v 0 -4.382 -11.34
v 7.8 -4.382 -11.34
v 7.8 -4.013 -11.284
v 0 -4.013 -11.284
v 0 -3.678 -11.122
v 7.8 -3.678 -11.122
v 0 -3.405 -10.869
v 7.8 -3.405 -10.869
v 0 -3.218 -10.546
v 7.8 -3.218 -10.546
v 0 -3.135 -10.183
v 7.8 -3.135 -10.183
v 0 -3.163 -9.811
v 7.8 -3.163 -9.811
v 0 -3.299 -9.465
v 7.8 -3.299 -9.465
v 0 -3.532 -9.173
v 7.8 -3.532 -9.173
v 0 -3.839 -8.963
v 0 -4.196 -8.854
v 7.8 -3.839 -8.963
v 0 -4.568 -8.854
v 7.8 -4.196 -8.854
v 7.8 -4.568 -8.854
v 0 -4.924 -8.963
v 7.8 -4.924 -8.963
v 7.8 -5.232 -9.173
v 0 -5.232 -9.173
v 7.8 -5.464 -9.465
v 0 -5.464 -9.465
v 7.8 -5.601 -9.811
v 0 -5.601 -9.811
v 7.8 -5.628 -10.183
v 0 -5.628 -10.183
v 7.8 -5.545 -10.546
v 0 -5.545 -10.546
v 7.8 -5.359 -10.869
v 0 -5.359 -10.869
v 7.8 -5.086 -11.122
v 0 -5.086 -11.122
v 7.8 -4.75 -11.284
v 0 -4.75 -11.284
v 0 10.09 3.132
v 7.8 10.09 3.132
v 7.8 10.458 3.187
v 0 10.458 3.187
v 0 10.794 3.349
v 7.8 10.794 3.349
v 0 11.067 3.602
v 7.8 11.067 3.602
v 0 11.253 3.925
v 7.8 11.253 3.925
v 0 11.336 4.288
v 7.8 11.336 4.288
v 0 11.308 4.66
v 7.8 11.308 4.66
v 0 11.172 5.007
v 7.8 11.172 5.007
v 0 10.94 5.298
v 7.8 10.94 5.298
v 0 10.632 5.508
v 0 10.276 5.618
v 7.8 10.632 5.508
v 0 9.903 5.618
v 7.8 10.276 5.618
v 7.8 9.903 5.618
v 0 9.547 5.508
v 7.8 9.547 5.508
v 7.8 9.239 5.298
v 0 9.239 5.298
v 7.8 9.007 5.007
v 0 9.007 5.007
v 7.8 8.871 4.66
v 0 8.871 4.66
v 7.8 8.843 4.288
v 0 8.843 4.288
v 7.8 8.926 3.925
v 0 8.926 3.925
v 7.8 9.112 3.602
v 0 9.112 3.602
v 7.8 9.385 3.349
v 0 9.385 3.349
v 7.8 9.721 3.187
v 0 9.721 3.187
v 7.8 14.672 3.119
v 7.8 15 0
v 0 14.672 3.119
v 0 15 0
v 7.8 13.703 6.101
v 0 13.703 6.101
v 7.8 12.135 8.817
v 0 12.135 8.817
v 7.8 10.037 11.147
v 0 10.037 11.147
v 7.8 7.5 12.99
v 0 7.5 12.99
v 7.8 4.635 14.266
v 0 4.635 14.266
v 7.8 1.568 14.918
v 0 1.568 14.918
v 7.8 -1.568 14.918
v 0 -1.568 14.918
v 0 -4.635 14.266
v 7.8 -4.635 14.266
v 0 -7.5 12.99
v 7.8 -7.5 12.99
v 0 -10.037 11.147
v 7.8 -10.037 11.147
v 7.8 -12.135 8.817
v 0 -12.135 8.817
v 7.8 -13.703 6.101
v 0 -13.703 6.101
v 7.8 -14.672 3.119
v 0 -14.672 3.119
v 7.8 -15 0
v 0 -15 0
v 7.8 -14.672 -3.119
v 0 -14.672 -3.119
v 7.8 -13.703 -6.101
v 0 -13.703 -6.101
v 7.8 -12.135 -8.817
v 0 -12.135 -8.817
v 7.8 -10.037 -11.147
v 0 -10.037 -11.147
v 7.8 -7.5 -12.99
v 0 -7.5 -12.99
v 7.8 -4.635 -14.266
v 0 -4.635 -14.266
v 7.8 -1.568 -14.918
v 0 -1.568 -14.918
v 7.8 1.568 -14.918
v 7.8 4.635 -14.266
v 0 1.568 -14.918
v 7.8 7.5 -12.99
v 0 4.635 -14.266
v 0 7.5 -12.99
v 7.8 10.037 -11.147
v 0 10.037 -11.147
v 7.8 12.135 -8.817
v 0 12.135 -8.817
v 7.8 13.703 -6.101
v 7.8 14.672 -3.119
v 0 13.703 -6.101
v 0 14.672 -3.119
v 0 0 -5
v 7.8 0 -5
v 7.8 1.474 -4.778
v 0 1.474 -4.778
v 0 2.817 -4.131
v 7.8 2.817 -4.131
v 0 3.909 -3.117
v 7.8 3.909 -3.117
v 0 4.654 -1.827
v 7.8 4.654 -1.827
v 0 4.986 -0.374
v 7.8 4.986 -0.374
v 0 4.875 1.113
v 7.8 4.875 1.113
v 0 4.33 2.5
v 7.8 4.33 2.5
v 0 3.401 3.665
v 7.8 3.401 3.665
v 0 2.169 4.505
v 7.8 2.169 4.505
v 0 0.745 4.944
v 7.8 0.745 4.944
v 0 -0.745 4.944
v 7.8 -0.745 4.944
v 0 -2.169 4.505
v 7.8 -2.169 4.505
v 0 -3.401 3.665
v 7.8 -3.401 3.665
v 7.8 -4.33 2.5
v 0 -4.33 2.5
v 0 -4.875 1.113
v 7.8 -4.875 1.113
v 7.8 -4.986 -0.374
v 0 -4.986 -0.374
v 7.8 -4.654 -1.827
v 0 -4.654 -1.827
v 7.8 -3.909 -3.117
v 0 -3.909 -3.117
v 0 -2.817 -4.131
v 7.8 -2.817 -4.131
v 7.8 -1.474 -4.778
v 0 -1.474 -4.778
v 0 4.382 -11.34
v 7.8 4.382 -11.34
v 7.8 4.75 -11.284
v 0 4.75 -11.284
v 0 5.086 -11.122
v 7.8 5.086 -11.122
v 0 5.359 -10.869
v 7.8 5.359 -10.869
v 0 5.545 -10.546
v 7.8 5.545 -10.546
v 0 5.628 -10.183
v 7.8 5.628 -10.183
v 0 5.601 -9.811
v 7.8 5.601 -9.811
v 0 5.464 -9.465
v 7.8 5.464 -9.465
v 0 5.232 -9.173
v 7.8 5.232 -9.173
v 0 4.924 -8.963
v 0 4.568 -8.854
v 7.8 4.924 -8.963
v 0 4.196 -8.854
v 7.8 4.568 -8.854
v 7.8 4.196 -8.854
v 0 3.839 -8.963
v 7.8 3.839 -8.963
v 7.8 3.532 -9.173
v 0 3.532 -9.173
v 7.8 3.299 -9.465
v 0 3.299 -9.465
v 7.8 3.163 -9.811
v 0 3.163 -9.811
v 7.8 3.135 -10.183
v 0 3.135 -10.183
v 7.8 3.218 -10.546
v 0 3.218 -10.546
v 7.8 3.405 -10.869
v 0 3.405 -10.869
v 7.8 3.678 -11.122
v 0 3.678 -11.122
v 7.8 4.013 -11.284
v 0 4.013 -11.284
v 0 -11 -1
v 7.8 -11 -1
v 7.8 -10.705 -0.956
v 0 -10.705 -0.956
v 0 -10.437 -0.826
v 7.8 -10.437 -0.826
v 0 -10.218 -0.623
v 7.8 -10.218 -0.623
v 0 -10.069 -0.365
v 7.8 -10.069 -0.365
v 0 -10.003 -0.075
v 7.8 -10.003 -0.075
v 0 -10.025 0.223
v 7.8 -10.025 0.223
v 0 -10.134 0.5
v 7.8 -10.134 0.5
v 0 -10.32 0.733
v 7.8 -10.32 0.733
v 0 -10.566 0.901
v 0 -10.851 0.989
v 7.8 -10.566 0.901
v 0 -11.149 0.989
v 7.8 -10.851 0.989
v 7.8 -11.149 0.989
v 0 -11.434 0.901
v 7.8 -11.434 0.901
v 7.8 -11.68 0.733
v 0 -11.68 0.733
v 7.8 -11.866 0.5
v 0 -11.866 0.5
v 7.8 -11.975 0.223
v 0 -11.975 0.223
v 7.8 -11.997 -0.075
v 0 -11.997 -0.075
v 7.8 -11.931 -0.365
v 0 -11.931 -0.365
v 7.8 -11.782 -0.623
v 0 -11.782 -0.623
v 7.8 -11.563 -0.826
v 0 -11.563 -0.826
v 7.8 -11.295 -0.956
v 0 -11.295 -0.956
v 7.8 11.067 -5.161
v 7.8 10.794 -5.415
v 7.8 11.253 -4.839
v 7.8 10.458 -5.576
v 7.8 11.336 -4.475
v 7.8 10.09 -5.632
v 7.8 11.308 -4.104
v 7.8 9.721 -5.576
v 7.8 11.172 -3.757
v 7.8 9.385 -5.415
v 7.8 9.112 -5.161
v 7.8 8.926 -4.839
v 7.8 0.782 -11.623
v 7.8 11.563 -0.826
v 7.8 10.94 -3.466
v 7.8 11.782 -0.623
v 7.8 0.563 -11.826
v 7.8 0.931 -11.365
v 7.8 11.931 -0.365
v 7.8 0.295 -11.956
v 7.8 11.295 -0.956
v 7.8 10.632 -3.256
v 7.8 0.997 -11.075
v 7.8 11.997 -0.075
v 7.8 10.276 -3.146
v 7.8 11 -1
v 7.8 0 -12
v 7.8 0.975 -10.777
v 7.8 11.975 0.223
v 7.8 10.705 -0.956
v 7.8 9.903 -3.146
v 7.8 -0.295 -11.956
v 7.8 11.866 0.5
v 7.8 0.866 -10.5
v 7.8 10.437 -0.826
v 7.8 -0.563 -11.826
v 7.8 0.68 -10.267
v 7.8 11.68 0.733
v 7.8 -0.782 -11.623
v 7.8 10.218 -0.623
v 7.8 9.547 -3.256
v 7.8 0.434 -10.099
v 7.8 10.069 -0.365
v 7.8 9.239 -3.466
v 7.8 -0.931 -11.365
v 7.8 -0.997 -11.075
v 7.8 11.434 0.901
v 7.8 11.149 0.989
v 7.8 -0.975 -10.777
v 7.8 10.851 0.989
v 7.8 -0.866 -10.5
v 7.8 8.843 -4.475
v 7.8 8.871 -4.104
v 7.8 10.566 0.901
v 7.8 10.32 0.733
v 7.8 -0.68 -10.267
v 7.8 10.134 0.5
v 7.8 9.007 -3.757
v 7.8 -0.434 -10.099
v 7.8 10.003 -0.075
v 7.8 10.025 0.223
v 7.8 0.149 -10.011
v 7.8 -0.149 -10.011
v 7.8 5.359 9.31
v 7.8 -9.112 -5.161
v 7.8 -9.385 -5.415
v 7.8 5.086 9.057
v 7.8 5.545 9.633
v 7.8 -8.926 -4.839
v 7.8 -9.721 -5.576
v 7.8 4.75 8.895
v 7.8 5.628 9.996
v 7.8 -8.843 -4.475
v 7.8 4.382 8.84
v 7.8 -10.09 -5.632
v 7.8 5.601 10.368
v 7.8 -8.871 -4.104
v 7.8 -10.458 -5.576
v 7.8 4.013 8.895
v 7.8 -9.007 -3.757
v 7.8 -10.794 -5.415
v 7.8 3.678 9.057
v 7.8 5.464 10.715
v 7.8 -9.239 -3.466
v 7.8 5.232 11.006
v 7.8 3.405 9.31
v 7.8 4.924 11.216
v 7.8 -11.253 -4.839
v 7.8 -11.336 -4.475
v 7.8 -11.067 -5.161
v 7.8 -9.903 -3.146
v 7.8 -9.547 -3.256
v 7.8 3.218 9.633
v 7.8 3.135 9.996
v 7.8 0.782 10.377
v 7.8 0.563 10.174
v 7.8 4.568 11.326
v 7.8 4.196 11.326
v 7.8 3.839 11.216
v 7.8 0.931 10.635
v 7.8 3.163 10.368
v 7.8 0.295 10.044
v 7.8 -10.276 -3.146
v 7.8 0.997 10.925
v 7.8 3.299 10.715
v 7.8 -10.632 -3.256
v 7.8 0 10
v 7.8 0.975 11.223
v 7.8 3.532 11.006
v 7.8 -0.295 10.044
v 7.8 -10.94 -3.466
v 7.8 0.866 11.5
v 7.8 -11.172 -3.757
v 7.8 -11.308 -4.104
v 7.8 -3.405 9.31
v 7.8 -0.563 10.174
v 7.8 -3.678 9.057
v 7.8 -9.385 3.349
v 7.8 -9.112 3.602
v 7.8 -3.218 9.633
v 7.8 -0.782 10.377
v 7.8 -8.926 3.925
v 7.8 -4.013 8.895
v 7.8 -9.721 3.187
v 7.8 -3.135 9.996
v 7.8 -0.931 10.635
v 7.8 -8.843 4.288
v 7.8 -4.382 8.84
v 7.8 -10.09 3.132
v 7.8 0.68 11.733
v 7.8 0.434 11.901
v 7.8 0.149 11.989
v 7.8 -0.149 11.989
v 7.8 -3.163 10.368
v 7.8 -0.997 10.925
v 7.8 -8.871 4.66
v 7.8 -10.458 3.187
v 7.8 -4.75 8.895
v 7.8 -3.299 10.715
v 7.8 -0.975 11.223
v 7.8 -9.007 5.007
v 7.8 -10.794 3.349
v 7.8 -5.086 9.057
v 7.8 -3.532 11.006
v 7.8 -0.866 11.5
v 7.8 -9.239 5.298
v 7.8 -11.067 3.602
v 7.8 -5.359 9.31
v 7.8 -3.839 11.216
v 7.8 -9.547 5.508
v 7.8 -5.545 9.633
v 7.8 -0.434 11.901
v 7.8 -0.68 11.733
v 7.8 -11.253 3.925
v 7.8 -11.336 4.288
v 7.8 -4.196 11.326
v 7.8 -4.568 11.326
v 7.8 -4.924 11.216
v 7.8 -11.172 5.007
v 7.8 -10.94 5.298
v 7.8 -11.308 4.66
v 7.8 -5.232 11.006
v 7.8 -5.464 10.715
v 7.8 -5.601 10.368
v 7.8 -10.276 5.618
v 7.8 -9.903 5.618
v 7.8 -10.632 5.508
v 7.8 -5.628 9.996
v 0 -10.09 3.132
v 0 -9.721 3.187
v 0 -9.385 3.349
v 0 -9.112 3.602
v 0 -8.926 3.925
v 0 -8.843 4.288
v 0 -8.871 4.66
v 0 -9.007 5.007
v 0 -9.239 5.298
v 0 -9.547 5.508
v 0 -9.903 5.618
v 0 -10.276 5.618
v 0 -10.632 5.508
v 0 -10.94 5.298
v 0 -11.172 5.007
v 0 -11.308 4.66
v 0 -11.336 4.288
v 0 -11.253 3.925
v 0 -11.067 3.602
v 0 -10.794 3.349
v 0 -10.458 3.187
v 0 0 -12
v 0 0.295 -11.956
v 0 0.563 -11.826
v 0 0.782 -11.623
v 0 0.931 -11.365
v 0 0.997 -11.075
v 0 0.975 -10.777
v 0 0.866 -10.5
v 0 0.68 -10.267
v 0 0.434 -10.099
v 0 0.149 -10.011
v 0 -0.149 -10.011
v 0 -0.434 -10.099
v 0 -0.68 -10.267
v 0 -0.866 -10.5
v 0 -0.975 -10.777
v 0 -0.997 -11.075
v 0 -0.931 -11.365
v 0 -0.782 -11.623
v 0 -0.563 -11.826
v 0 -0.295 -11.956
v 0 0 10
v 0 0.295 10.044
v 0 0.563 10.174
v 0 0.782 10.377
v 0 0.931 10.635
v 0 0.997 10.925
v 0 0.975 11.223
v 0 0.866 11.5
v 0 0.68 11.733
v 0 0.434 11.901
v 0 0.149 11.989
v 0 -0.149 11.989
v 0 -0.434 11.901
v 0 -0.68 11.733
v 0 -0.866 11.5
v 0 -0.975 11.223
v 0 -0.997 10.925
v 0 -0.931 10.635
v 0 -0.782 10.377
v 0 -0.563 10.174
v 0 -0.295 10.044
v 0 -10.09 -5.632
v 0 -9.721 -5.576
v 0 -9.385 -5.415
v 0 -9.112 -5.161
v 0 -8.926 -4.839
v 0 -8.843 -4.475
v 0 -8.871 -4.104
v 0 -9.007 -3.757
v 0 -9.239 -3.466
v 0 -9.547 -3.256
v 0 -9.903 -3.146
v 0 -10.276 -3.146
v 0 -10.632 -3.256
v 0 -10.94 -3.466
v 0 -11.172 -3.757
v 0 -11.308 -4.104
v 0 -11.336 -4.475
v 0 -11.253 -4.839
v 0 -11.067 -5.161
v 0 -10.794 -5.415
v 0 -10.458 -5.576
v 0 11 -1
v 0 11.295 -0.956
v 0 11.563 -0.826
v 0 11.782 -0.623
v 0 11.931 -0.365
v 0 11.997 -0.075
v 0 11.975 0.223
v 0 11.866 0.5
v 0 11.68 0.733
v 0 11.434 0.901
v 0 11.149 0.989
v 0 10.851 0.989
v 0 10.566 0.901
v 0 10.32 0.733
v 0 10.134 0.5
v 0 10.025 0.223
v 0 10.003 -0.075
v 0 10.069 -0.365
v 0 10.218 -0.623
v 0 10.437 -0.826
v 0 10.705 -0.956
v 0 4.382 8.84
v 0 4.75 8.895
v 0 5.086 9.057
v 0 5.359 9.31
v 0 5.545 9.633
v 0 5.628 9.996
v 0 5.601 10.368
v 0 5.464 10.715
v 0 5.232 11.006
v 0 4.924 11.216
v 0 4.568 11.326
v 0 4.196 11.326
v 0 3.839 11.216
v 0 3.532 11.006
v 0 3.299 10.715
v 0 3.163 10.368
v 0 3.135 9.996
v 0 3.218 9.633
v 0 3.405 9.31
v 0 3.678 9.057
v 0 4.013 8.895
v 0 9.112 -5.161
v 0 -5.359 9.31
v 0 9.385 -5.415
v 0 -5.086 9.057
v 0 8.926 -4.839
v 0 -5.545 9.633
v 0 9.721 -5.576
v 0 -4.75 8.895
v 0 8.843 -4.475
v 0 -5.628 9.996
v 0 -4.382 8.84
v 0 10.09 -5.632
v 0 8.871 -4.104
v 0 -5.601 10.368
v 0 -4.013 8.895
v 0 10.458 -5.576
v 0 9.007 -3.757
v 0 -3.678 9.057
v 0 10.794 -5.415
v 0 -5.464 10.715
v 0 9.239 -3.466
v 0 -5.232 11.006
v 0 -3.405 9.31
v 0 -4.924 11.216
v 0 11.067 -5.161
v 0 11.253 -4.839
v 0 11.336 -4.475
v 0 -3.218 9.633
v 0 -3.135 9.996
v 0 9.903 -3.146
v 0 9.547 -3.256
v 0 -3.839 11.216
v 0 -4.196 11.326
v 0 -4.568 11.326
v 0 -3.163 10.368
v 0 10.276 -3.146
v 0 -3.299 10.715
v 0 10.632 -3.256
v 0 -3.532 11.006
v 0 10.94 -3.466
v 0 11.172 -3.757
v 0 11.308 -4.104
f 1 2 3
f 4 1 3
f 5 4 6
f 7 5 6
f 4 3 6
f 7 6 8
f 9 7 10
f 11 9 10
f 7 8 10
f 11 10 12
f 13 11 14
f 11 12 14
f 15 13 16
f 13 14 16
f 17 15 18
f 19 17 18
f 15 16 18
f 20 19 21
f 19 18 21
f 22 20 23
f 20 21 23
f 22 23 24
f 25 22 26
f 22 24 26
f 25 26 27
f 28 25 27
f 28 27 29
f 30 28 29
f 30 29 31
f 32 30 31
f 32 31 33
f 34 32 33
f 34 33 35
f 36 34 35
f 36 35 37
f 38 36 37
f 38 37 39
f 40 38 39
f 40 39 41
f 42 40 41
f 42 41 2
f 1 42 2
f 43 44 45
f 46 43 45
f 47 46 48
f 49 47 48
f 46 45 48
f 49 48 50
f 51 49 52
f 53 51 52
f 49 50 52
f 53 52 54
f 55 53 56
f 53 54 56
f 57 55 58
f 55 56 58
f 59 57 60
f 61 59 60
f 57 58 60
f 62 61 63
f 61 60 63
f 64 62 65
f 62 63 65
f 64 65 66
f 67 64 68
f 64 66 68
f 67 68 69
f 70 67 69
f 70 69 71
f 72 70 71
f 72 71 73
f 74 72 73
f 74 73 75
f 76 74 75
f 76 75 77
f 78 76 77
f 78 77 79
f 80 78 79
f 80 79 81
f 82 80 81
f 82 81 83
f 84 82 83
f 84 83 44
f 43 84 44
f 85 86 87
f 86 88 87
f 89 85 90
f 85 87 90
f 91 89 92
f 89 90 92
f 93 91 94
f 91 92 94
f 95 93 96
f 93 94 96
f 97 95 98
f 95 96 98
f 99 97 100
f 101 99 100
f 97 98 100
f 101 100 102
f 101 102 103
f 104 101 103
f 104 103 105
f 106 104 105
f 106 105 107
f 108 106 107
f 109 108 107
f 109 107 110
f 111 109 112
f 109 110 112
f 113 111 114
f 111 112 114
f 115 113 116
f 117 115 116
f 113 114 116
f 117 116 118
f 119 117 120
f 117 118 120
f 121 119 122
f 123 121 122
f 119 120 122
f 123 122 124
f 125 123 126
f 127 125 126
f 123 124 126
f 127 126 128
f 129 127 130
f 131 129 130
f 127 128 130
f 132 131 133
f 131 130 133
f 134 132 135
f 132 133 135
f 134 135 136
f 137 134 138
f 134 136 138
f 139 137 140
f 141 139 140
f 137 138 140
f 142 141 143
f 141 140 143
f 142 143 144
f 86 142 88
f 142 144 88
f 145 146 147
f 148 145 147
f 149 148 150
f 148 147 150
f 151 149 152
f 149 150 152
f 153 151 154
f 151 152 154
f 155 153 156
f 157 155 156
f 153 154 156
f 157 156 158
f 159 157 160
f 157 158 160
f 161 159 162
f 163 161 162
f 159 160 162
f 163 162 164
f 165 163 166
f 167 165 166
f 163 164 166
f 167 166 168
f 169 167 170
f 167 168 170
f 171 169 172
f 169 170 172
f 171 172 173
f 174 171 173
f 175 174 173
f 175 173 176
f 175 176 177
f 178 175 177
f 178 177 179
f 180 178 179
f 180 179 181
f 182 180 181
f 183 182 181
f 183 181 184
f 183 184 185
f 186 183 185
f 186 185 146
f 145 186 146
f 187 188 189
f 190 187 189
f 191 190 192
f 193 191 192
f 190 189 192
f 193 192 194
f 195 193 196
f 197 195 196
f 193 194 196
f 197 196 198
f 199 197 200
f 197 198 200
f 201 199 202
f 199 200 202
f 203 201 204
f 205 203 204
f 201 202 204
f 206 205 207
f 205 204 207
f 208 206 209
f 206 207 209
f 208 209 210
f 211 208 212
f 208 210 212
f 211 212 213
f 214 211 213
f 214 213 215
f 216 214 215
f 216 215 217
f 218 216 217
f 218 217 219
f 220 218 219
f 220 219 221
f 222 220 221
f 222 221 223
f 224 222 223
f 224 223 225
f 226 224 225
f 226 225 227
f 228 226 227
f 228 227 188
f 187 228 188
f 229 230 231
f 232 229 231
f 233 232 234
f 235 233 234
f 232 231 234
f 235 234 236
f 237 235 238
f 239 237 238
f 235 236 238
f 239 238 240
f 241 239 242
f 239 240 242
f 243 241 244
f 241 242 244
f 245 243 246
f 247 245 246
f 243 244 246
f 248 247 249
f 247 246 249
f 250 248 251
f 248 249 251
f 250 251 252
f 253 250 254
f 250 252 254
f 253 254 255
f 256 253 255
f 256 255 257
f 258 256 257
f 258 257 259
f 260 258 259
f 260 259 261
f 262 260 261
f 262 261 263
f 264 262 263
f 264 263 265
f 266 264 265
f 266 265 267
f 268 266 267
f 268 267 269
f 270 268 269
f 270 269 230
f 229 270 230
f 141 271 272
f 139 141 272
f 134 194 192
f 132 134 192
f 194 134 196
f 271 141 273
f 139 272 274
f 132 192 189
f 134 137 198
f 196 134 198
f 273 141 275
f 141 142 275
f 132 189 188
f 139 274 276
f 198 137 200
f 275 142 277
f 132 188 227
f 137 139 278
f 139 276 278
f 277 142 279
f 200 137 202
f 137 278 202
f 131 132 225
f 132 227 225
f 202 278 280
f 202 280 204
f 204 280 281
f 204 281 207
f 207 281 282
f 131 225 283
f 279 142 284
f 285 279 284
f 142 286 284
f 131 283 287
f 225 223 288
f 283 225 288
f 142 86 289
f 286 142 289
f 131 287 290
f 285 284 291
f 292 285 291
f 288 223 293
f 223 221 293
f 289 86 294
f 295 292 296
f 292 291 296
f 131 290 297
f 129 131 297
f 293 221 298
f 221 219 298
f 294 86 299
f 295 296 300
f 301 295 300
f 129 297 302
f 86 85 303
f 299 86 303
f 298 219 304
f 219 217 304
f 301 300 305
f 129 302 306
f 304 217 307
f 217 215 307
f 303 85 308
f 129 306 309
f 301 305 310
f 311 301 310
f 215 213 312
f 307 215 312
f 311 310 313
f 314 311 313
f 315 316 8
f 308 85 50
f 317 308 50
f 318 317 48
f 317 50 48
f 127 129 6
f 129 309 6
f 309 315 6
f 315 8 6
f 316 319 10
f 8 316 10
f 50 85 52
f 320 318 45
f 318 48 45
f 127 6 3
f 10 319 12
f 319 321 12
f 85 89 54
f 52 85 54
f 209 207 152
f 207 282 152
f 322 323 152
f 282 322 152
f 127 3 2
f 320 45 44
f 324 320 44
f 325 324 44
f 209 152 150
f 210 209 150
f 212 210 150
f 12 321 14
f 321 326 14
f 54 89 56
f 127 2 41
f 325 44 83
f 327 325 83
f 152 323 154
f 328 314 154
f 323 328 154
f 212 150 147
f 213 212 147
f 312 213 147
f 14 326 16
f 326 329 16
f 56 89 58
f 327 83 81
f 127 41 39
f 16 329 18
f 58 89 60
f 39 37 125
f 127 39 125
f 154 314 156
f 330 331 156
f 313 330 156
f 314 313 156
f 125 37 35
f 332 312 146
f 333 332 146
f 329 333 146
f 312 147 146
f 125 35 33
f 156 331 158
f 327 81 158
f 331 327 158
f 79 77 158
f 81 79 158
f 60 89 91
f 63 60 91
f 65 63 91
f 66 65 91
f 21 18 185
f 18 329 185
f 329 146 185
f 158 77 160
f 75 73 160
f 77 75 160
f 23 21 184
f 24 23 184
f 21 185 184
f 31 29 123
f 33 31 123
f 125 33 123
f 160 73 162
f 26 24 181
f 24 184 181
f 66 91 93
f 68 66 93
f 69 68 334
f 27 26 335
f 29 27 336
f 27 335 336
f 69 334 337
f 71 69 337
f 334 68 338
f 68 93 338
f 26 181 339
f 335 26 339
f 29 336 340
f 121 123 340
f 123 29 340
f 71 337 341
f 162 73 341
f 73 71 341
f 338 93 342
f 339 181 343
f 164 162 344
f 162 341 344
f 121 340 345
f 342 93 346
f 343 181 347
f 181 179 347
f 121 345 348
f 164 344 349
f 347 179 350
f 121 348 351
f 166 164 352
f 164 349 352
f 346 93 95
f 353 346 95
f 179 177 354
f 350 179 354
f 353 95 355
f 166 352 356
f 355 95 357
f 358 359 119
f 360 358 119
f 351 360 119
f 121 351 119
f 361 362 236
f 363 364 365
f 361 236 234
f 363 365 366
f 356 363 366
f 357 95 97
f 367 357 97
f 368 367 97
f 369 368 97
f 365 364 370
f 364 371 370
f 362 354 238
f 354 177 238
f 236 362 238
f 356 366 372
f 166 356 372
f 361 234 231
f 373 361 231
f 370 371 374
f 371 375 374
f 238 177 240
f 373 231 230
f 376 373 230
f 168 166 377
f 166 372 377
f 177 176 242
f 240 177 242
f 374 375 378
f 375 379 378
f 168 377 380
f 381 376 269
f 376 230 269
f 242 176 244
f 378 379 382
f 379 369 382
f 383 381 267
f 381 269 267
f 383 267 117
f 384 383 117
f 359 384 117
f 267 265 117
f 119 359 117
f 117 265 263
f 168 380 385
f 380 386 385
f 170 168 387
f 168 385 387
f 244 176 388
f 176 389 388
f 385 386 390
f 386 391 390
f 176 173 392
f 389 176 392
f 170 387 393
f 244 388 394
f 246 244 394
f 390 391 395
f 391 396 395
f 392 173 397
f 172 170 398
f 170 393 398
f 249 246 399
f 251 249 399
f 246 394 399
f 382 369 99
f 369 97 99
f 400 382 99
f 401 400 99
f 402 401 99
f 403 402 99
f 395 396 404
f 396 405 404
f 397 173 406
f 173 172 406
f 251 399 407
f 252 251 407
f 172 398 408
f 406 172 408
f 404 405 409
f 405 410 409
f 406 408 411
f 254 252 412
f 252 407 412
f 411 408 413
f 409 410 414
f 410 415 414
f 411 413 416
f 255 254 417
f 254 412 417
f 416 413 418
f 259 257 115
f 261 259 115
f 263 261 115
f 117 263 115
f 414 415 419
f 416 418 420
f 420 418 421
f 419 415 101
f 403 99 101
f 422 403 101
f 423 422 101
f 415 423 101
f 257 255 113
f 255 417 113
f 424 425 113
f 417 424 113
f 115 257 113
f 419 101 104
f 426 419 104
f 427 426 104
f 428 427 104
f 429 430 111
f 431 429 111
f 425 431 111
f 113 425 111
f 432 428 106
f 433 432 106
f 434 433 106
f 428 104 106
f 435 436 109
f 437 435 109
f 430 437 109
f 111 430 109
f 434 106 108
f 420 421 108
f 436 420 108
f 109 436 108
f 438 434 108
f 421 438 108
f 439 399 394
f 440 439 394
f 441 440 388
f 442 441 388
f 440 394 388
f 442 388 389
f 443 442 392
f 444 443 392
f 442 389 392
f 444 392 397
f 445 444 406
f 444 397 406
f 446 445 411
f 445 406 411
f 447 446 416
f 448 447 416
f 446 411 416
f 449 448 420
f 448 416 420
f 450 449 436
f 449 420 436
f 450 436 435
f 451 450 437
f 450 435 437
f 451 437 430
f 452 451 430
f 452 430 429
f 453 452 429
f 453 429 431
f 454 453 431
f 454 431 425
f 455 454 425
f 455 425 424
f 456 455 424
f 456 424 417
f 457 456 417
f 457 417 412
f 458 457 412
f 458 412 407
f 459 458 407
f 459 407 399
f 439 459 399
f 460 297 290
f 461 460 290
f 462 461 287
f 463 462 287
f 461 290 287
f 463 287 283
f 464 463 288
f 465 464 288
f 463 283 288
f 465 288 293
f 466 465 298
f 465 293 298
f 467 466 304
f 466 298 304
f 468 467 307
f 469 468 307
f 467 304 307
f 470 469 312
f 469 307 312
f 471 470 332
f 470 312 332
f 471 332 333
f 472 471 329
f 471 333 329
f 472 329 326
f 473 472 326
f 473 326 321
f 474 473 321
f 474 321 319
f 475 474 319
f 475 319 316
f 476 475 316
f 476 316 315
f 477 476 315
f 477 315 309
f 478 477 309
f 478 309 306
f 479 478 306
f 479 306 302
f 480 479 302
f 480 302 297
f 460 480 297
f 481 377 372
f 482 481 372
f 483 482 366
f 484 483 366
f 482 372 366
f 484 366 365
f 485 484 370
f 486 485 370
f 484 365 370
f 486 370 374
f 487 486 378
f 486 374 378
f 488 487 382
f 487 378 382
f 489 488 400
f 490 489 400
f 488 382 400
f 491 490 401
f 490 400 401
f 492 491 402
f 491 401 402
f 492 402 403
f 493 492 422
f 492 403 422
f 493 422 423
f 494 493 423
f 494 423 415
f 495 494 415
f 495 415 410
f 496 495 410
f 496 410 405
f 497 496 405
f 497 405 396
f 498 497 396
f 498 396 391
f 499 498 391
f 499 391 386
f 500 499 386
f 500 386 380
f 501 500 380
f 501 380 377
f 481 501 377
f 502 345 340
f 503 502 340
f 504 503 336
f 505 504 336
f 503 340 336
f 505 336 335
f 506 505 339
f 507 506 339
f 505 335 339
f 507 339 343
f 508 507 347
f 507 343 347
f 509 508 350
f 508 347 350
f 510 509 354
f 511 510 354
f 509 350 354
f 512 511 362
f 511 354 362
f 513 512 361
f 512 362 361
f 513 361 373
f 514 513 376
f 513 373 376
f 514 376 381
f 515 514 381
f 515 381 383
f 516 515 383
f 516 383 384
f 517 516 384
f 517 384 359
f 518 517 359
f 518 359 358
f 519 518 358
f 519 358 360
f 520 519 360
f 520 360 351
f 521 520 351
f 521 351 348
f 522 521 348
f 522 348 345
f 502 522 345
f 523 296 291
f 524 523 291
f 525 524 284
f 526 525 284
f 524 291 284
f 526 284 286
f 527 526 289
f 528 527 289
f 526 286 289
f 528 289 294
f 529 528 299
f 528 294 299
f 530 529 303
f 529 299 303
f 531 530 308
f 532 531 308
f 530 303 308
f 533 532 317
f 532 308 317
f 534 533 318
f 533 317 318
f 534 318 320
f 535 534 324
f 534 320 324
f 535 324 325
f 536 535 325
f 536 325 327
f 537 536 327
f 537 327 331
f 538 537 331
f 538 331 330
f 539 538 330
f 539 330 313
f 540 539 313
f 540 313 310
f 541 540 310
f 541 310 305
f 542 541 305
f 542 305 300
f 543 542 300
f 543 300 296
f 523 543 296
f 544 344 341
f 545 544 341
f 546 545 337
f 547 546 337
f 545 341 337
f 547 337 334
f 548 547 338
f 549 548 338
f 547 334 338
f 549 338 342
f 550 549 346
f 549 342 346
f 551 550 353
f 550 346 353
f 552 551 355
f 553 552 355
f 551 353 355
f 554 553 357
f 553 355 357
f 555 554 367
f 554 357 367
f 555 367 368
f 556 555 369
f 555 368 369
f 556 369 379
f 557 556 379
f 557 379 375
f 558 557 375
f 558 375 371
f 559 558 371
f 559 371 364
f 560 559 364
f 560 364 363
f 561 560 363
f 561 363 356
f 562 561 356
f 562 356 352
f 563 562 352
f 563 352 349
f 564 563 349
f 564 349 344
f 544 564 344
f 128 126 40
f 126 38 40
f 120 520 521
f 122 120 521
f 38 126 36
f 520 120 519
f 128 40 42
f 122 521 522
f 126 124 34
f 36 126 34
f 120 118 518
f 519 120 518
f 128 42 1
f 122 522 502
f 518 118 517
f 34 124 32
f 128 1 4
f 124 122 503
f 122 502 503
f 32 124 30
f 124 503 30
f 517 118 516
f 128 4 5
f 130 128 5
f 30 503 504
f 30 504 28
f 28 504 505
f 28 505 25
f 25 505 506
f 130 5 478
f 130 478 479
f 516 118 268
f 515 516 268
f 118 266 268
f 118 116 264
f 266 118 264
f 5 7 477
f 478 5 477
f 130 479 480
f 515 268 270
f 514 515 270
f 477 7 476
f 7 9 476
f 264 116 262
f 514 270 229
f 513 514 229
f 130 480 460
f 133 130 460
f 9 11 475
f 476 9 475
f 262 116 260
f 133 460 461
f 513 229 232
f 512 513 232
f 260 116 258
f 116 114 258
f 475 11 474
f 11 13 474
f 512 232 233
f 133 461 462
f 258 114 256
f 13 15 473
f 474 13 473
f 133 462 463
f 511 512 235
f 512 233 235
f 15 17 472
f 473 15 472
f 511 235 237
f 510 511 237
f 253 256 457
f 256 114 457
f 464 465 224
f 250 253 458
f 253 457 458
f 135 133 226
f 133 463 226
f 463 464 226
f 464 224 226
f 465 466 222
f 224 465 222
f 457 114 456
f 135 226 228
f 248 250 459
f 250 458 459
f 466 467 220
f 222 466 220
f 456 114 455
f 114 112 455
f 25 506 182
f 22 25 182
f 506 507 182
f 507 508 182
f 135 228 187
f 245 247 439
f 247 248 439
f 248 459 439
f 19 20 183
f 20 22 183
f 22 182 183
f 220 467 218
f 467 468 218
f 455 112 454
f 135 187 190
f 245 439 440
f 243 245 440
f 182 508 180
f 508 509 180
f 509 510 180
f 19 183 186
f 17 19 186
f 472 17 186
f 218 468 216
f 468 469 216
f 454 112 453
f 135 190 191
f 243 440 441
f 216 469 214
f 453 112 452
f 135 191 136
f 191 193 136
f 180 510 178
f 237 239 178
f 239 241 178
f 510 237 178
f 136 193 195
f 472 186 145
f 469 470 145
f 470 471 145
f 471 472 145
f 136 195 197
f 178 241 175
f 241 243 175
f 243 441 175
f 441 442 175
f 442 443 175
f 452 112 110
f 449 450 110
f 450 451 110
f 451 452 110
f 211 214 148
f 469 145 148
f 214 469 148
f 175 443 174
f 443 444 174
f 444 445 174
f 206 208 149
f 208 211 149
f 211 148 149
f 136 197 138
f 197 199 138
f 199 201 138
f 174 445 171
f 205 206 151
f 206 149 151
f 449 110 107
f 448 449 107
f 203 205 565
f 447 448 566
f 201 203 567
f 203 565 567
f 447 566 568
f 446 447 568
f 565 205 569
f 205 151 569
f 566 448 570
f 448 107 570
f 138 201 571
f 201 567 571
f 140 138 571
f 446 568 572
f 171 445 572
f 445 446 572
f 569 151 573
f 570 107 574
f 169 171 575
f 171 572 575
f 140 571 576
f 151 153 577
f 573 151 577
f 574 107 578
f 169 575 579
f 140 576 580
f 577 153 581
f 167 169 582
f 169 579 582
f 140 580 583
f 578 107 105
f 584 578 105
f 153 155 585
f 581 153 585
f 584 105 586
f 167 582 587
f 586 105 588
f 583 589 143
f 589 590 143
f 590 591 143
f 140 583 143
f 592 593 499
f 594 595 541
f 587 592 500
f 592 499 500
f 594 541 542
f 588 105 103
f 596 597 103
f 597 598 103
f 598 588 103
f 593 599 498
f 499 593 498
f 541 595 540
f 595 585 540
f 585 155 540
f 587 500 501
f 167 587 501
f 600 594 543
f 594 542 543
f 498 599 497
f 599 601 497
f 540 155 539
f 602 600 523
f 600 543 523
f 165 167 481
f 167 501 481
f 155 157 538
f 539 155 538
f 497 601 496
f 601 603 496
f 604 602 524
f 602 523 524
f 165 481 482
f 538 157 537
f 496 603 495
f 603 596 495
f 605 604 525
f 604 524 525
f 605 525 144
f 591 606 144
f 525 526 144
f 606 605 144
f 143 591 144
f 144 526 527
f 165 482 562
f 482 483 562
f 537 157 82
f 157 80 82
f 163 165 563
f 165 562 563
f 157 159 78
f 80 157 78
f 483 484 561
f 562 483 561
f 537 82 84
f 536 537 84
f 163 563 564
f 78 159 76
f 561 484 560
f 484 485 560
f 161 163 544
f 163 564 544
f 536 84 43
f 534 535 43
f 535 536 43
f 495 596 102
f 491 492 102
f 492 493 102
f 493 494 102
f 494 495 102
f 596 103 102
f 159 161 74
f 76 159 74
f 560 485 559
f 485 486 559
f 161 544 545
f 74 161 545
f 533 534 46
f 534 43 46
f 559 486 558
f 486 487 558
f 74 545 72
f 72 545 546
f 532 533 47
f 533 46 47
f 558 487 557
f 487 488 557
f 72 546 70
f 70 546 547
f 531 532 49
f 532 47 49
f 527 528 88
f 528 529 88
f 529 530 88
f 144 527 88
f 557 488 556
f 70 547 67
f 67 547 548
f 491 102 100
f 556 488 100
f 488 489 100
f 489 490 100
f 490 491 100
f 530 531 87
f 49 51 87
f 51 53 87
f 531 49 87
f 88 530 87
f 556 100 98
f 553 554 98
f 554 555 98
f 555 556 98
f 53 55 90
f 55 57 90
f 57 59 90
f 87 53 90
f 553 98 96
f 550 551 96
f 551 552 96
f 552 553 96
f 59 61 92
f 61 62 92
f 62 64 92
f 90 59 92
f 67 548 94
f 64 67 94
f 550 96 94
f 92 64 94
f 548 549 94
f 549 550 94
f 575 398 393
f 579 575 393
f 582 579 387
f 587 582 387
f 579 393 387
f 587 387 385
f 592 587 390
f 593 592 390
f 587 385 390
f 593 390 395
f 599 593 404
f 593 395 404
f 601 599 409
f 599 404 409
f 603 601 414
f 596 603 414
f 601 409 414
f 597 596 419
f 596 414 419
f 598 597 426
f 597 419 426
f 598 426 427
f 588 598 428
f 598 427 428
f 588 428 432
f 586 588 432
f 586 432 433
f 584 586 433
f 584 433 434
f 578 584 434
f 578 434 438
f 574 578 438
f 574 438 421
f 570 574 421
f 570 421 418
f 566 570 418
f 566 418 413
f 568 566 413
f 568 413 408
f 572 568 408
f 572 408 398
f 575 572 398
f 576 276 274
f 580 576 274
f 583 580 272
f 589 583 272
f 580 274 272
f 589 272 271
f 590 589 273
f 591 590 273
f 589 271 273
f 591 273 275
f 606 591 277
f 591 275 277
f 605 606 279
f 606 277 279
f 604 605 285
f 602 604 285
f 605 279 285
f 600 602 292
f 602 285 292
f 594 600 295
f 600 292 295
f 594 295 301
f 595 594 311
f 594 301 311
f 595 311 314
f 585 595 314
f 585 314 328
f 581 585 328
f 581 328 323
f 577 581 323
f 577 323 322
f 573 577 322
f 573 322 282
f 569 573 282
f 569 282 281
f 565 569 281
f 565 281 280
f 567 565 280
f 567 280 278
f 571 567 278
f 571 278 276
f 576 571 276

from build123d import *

# Parameters (mm, degrees)
SKETCH4_R          = 1
SKETCH4_R_2        = 1.25
EXTRUDE2_DEPTH     = 8.8
SKETCH5_R          = 5
CUT_EXTRUDE1_DEPTH = 8.8


with BuildPart() as part:
    # Sketch1 → Revolve1 (revolve)
    with BuildSketch(Plane.XY):
        Polygon((6.609375, 15), (1.190625, 15), (0, 15), (0, 14), (0, 0), (7.8, 0), (7.8, 14), (7.8, 15), align=None)
    revolve(axis=Axis((0, 0, 0), (1, 0, 0)))

    # Sketch4 → Extrude2 (cut, through all)
    with BuildSketch(Plane(origin=(7.8, 0, 0), x_dir=(0, 0, -1), z_dir=(1, 0, 0))):
        with Locations((0, 11)):
            Circle(SKETCH4_R)
        with Locations((-4.381841494, 10.089572098)):
            Circle(SKETCH4_R_2)
        with Locations((4.381841494, 10.089572098)):
            Circle(SKETCH4_R_2)
        with Locations((10.089572098, -4.381841494)):
            Circle(SKETCH4_R_2)
        with Locations((11, 0)):
            Circle(SKETCH4_R)
        with Locations((10.089572098, 4.381841494)):
            Circle(SKETCH4_R_2)
        with Locations((-4.381841494, -10.089572098)):
            Circle(SKETCH4_R_2)
        with Locations((0, -11)):
            Circle(SKETCH4_R)
        with Locations((4.381841494, -10.089572098)):
            Circle(SKETCH4_R_2)
        with Locations((-10.089572098, 4.381841494)):
            Circle(SKETCH4_R_2)
        with Locations((-11, 0)):
            Circle(SKETCH4_R)
        with Locations((-10.089572098, -4.381841494)):
            Circle(SKETCH4_R_2)
    extrude(amount=-EXTRUDE2_DEPTH, mode=Mode.SUBTRACT)

    # Sketch5 → Cut-Extrude1 (cut, through all)
    with BuildSketch(Plane(origin=(7.8, 0, 0), x_dir=(0, 0, -1), z_dir=(1, 0, 0))):
        Circle(SKETCH5_R)
    extrude(amount=-CUT_EXTRUDE1_DEPTH, mode=Mode.SUBTRACT)


solid = part.part
